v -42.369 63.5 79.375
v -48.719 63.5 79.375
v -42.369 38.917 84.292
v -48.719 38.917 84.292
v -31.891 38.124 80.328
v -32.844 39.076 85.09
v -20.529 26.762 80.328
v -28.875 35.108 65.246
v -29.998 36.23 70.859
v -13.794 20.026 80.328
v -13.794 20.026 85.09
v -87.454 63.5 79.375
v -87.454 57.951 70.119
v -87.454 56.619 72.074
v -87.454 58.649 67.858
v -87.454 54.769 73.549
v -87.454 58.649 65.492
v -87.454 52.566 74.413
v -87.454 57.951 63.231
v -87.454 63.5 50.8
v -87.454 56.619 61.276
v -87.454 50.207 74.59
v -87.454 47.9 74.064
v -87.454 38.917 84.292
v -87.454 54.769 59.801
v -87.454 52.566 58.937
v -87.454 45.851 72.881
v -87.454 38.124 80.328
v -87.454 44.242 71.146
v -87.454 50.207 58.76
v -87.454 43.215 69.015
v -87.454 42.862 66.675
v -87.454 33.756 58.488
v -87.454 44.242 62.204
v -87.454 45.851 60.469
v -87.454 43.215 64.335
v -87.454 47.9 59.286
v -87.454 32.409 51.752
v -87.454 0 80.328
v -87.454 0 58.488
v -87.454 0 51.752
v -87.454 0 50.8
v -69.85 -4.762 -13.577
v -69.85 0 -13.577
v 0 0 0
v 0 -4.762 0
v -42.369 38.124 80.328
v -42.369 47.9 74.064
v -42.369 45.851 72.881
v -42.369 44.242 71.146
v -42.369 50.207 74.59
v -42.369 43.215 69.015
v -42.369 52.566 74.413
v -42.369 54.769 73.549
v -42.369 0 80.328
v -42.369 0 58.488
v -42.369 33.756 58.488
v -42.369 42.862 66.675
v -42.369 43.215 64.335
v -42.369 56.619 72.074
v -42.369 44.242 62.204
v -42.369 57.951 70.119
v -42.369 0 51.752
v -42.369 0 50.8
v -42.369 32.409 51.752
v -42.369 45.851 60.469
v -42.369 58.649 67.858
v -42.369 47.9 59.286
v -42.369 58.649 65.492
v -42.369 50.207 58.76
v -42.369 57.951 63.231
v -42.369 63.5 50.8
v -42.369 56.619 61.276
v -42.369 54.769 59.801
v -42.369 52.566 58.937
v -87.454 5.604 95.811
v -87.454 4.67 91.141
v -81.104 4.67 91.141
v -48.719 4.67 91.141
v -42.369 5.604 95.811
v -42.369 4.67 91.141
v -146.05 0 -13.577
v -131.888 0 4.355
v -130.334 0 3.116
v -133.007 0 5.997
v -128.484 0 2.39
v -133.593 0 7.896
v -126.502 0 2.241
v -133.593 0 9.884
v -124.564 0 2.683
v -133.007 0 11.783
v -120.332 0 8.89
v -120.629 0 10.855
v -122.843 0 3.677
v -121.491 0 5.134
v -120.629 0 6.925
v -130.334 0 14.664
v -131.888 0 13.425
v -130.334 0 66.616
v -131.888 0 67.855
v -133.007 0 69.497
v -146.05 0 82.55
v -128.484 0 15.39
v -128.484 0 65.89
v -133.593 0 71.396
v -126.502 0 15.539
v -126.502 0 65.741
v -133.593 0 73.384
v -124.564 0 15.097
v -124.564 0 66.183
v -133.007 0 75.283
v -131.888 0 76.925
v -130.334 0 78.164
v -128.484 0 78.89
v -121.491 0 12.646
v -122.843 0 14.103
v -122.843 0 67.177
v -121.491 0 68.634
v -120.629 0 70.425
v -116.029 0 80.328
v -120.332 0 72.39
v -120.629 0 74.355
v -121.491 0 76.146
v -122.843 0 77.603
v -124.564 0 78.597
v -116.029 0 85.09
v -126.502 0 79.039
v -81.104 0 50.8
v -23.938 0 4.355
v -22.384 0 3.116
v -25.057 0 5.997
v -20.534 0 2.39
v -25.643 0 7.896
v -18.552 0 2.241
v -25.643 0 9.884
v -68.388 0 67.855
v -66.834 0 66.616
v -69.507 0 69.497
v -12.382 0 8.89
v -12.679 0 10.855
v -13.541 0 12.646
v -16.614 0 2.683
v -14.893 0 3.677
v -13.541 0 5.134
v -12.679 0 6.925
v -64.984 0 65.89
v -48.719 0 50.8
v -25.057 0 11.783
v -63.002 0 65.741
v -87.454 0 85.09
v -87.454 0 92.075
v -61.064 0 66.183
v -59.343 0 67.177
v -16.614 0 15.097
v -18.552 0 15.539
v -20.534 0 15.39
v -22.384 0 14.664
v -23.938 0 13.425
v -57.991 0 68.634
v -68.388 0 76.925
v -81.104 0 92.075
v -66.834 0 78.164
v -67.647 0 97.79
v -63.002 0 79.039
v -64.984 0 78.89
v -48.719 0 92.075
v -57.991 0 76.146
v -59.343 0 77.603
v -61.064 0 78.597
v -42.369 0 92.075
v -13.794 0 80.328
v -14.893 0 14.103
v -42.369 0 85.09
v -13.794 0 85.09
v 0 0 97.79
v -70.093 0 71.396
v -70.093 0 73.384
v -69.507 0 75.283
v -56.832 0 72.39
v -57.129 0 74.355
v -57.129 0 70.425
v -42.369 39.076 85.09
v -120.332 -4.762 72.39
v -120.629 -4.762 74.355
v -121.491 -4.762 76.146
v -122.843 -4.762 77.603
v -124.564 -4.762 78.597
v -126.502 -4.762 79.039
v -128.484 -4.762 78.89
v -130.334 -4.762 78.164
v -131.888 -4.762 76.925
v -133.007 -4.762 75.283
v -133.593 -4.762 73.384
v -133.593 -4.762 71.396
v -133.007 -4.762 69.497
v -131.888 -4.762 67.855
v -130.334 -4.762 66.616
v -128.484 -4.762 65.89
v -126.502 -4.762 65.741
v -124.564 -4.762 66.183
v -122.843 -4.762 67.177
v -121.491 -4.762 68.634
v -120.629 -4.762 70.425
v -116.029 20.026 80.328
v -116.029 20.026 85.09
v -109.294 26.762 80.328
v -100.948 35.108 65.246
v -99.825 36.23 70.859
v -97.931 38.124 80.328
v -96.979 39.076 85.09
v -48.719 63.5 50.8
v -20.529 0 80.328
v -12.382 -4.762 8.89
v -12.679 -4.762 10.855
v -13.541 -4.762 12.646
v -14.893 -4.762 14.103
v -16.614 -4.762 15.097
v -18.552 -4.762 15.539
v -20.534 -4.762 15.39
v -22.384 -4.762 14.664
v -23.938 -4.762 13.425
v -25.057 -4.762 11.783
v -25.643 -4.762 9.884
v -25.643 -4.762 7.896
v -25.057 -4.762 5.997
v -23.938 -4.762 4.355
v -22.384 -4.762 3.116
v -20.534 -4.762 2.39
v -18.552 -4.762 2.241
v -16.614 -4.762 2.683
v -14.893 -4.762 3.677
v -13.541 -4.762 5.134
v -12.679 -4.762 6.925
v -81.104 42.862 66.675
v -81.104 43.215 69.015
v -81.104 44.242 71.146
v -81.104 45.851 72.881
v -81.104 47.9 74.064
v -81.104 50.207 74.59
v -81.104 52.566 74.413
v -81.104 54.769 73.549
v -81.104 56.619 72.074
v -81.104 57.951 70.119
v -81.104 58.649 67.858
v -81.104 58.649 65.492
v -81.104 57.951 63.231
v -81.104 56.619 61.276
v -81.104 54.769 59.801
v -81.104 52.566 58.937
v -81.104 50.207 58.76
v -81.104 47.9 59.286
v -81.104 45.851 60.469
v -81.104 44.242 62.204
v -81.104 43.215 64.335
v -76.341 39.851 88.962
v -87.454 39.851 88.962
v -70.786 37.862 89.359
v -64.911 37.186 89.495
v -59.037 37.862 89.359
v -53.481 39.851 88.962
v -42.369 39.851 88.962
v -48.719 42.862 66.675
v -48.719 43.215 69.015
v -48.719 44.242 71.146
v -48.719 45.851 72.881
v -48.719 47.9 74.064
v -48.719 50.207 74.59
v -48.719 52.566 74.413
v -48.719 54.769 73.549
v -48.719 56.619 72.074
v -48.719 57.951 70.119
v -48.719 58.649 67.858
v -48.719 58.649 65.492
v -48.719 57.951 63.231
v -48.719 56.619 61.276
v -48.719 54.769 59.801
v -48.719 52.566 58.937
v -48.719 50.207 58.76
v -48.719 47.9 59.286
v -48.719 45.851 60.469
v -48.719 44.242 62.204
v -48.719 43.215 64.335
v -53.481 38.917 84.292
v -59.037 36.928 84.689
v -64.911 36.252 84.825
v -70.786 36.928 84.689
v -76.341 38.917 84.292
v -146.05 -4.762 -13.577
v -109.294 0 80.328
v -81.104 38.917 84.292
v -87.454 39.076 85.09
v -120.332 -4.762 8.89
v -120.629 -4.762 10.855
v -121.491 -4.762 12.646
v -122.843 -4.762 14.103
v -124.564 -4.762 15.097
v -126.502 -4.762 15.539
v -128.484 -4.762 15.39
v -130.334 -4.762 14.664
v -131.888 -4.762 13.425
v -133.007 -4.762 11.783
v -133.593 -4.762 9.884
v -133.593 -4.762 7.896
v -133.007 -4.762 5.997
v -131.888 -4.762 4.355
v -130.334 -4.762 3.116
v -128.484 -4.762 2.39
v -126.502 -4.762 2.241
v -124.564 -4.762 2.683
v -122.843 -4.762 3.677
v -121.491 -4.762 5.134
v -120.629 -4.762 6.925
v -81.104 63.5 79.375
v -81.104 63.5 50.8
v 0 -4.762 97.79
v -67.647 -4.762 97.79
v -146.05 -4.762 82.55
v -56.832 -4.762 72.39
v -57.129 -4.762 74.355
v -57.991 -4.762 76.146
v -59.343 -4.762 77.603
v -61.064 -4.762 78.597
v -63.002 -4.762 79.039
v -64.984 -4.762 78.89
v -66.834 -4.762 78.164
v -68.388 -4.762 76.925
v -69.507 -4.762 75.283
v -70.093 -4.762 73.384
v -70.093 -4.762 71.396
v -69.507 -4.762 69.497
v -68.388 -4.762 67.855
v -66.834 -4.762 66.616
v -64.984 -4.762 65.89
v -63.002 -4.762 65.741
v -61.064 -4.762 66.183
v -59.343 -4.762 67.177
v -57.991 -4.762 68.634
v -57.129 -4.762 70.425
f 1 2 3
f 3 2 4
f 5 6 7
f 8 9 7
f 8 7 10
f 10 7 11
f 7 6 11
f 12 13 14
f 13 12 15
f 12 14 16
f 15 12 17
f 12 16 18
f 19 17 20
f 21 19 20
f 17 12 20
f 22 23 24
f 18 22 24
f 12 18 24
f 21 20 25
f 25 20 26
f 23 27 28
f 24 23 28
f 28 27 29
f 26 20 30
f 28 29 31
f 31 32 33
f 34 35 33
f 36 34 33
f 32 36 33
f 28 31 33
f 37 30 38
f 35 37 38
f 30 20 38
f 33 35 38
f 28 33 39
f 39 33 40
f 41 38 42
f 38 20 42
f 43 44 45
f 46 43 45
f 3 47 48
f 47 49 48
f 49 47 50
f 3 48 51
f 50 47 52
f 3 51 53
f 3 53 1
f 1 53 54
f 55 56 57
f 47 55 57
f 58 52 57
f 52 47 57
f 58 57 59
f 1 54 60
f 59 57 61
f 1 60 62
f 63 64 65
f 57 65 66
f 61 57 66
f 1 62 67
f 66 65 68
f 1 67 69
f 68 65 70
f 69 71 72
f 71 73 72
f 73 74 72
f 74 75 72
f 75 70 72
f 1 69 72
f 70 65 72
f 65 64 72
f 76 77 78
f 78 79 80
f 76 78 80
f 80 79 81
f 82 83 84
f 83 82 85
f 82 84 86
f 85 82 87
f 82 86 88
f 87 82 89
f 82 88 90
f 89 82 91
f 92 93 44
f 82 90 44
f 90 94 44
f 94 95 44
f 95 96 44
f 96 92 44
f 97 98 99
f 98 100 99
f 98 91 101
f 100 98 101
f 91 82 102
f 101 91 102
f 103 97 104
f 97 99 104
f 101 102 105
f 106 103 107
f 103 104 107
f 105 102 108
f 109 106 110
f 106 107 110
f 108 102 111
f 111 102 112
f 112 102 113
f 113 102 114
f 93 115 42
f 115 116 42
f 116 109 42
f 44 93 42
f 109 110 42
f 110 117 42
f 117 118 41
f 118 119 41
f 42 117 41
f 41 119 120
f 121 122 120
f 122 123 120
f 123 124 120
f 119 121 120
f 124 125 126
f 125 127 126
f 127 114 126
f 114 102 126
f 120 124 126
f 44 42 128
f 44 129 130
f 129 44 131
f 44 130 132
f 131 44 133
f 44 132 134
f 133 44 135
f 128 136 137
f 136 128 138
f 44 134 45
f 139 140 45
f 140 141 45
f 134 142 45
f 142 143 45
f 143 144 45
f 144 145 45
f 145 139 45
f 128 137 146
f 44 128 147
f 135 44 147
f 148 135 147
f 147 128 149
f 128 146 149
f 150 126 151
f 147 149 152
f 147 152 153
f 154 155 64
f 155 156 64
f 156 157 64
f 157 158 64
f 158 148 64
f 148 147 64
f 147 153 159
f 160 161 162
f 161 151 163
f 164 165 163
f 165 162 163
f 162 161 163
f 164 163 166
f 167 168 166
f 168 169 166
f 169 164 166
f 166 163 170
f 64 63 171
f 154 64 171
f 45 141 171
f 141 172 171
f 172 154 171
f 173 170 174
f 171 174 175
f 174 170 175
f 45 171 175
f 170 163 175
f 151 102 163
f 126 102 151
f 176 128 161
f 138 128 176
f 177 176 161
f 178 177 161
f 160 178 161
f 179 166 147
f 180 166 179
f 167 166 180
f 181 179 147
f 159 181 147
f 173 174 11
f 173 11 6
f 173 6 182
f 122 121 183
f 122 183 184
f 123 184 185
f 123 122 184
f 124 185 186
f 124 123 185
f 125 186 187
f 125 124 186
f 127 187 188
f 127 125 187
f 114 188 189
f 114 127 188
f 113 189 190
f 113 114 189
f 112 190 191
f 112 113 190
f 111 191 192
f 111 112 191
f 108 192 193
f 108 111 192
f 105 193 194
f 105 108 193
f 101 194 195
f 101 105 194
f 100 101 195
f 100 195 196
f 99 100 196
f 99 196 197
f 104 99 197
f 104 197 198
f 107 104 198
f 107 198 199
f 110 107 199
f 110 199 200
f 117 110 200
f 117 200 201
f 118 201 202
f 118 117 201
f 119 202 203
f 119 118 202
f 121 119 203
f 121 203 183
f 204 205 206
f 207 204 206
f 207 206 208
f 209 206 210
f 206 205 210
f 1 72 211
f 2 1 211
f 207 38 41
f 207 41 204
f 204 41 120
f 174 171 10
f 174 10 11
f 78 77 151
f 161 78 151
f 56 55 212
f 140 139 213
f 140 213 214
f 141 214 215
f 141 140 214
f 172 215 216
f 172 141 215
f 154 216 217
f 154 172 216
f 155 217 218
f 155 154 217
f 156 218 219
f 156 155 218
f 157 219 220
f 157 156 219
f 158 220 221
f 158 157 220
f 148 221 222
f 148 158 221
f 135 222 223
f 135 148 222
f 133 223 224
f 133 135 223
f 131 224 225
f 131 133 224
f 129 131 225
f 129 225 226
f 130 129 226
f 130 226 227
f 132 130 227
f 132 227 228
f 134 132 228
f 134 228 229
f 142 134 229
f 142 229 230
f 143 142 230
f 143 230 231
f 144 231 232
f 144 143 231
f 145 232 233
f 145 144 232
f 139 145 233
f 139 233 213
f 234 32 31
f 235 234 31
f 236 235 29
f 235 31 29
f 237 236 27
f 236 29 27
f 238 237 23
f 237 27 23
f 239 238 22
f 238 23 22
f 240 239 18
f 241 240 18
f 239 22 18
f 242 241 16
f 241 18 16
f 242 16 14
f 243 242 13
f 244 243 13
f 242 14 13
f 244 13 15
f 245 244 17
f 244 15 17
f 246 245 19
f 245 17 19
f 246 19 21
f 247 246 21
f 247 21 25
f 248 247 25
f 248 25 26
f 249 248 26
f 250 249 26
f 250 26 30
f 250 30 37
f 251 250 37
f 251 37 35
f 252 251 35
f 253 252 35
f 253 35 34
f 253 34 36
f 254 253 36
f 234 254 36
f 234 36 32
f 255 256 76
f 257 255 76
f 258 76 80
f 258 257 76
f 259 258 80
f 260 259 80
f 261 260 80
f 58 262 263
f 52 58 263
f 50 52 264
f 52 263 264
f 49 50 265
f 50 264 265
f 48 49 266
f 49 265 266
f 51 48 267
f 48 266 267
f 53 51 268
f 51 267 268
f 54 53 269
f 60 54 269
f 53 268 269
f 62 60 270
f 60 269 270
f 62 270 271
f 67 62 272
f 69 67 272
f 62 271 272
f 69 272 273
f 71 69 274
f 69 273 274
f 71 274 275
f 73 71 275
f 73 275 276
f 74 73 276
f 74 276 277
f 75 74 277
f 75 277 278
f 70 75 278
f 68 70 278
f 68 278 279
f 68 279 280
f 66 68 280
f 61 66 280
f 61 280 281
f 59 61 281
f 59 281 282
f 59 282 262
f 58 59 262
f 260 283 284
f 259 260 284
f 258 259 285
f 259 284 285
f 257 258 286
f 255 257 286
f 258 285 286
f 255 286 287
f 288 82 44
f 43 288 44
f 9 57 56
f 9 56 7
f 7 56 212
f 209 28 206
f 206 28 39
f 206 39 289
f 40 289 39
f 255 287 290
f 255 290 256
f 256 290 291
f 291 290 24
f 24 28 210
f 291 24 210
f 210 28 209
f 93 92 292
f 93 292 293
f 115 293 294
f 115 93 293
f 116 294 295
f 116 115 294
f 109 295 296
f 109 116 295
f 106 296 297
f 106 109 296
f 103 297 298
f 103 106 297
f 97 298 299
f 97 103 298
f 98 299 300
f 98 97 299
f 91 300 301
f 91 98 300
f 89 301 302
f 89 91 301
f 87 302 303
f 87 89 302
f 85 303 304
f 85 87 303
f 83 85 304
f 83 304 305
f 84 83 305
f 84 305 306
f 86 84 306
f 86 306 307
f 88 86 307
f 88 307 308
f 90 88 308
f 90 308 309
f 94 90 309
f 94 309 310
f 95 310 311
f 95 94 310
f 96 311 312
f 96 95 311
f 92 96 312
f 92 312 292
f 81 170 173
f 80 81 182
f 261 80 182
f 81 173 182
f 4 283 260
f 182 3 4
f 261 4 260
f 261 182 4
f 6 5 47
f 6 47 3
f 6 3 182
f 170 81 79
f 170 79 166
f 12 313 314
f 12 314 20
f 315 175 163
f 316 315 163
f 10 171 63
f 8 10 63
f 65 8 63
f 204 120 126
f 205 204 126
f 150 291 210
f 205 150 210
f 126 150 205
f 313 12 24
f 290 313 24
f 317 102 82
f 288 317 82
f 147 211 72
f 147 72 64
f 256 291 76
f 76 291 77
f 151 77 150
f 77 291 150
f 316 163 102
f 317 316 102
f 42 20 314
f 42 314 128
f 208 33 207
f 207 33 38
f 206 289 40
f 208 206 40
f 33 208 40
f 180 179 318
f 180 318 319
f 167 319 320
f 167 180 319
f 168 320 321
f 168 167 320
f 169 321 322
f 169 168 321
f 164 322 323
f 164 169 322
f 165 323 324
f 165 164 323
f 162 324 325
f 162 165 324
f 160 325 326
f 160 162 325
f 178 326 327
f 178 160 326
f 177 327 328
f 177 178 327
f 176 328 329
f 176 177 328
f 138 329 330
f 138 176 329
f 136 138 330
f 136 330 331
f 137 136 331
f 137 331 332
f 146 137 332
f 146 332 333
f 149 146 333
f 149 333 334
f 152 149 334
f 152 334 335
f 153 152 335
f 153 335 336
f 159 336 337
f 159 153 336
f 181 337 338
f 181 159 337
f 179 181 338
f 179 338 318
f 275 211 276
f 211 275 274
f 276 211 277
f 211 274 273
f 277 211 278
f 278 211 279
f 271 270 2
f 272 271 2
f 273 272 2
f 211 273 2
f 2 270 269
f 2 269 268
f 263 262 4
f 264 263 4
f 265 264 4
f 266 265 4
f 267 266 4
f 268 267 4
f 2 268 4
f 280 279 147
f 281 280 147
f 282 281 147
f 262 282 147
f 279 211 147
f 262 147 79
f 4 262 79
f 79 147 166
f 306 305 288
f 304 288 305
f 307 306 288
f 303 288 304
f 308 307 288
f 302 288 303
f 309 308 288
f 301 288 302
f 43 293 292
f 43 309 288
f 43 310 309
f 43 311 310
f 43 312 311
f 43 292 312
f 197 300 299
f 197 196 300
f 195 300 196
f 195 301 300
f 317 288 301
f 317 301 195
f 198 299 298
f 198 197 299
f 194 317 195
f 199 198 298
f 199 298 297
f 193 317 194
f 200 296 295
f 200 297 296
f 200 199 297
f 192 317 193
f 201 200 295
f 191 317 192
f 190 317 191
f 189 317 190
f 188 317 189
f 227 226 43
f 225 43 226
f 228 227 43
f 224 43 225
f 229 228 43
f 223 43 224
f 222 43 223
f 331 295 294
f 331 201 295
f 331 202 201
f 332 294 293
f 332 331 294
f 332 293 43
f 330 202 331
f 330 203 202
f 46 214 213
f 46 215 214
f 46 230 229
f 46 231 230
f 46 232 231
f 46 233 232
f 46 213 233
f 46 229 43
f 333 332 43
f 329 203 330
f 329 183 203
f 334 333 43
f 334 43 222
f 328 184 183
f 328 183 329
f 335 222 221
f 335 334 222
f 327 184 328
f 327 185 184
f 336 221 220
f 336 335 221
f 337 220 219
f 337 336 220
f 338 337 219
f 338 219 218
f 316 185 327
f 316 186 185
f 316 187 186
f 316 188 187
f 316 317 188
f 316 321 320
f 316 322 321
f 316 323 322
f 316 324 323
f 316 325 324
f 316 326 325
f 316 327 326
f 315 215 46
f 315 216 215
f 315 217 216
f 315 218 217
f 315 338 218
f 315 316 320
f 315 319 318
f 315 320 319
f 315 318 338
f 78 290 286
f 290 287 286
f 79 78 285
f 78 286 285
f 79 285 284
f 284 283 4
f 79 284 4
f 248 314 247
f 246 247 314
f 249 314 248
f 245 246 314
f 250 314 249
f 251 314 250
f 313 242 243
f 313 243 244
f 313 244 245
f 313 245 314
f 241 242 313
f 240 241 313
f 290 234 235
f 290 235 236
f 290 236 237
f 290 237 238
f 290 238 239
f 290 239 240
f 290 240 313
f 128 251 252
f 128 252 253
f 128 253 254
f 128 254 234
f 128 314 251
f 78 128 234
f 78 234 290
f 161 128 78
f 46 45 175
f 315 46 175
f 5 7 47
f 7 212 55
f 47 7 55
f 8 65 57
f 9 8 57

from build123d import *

# Parameters (mm, degrees)
F0_R      = 6.6675
F1_DEPTH  = 4.7625
F2_W      = 6.35
F2_H      = 66.675
F3_DEPTH  = 63.5
F4_R      = 7.9375
F4_W      = 63.5
F4_H      = 25.4
F5_DEPTH  = 87.4548256
F7_DEPTH  = 4.7625
F8_W      = 28.575
F8_H      = 4.7625
F9_REACH  = 92.4701565505
F11_REACH = 103.9121525448
F13_DEPTH = 98.6684645933


with BuildPart() as f1:
    # F0 (on Front) → F1 (new body)
    with BuildSketch(Plane.XZ):
        Polygon((-67.6469967966, 97.79), (-146.05, 82.55), (-146.05, -13.5774645933), (-69.85, -13.5774645933), (0, 0), (0, 97.79), align=None)
        with Locations((-127, 8.89)):
            Circle(F0_R, mode=Mode.SUBTRACT)
        with Locations((-19.05, 8.89)):
            Circle(F0_R, mode=Mode.SUBTRACT)
        with Locations((-127, 72.39)):
            Circle(F0_R, mode=Mode.SUBTRACT)
        with Locations((-63.5, 72.39)):
            Circle(F0_R, mode=Mode.SUBTRACT)
    extrude(amount=F1_DEPTH)

    # F2 (on face) → F3 (join)
    with BuildSketch(Plane(origin=(0, 0, 0), x_dir=(-1, 0, 0), z_dir=(0, 1, 0))):
        with Locations((45.5438256, 58.7375)):
            Rectangle(F2_W, F2_H)
        with Locations((84.2788256, 58.7375)):
            Rectangle(F2_W, F2_H)
    extrude(amount=F3_DEPTH)

    # F4 (on face) → F5 (cut, through all)
    with BuildSketch(Plane(origin=(-87.4538256, 0, 0), x_dir=(0, -1, 0), z_dir=(-1, 0, 0))):
        Polygon((-63.5, 79.375), (0, 92.075), (-63.5, 92.075), align=None)
        with Locations((-50.8, 66.675)):
            Circle(F4_R)
        with Locations((-31.75, 38.1)):
            Rectangle(F4_W, F4_H)
    extrude(amount=-F5_DEPTH, mode=Mode.SUBTRACT)

    # F6 (on face) → F7 (join)
    with BuildSketch(Plane(origin=(0, 17.7067307692, 88.5336538462), x_dir=(1, 0, 0), z_dir=(0, 0.1961161351, 0.9805806757))):
        with BuildLine():
            Line((-87.4538256, -13.2948931428), (-42.3688256, -13.2948931428))
            Line((-42.3688256, -13.2948931428), (-42.3688256, 21.6301068572))
            Line((-42.3688256, 21.6301068572), (-53.4813256, 21.6301068572))
            ThreePointArc((-53.4813256, 21.6301068572), (-64.9113256, 18.9130321535), (-76.3413256, 21.6301068572))
            Line((-76.3413256, 21.6301068572), (-87.4538256, 21.6301068572))
            Line((-87.4538256, 21.6301068572), (-87.4538256, -13.2948931428))
        make_face()
    extrude(amount=F7_DEPTH)

    f9_end = Plane(origin=(-47.9250756, 39.3837971133, 86.6266486207), x_dir=(0, 0.1961161351, 0.9805806757), z_dir=(0, 0.9805806757, -0.1961161351))
    # F8 (on face) → F9 (join, up to a plane its end follows)
    with BuildSketch(Plane(origin=(0, 0, 0), x_dir=(-1, 0, 0), z_dir=(0, 1, 0))):
        with Locations((28.0813256, 82.70875)):
            Rectangle(F8_W, F8_H)
        with Locations((101.7413256, 82.70875)):
            Rectangle(F8_W, F8_H)
    f9_long = extrude(amount=F9_REACH, mode=Mode.PRIVATE)
    add(split(f9_long, bisect_by=f9_end, keep=Keep.BOTTOM, mode=Mode.PRIVATE))

    f11_end = Plane(origin=(-33.5594638675, 38.8165352763, 83.7903394356), x_dir=(0, 0.1961161351, 0.9805806757), z_dir=(0, 0.9805806757, -0.1961161351))
    # F10 (on face) → F11 (join, up to a plane its end follows)
    with BuildSketch(Plane(origin=(0, 0, 0), x_dir=(-1, 0, 0), z_dir=(0, 1, 0))):
        Polygon((20.5290176908, 80.3275), (13.7938256, 80.3275), (42.3688256, 51.7525), (42.3688256, 58.4876920908), align=None)
        Polygon((116.0288256, 80.3275), (109.2936335092, 80.3275), (87.4538256, 58.4876920908), (87.4538256, 51.7525), align=None)
    f11_long = extrude(amount=F11_REACH, mode=Mode.PRIVATE)
    add(split(f11_long, bisect_by=f11_end, keep=Keep.BOTTOM, mode=Mode.PRIVATE))

    # F12 (on face) → F13 (cut, through all)
    with BuildSketch(Plane.XY.offset(85.09)):
        Polygon((-13.7938256, 39.0764673892), (-32.8438256, 39.0764673892), (-13.7938256, 20.0264673892), align=None)
        Polygon((-116.0288256, 20.0264673892), (-96.9788256, 39.0764673892), (-116.0288256, 39.0764673892), align=None)
    extrude(amount=-F13_DEPTH, mode=Mode.SUBTRACT)


solid = f1.part
